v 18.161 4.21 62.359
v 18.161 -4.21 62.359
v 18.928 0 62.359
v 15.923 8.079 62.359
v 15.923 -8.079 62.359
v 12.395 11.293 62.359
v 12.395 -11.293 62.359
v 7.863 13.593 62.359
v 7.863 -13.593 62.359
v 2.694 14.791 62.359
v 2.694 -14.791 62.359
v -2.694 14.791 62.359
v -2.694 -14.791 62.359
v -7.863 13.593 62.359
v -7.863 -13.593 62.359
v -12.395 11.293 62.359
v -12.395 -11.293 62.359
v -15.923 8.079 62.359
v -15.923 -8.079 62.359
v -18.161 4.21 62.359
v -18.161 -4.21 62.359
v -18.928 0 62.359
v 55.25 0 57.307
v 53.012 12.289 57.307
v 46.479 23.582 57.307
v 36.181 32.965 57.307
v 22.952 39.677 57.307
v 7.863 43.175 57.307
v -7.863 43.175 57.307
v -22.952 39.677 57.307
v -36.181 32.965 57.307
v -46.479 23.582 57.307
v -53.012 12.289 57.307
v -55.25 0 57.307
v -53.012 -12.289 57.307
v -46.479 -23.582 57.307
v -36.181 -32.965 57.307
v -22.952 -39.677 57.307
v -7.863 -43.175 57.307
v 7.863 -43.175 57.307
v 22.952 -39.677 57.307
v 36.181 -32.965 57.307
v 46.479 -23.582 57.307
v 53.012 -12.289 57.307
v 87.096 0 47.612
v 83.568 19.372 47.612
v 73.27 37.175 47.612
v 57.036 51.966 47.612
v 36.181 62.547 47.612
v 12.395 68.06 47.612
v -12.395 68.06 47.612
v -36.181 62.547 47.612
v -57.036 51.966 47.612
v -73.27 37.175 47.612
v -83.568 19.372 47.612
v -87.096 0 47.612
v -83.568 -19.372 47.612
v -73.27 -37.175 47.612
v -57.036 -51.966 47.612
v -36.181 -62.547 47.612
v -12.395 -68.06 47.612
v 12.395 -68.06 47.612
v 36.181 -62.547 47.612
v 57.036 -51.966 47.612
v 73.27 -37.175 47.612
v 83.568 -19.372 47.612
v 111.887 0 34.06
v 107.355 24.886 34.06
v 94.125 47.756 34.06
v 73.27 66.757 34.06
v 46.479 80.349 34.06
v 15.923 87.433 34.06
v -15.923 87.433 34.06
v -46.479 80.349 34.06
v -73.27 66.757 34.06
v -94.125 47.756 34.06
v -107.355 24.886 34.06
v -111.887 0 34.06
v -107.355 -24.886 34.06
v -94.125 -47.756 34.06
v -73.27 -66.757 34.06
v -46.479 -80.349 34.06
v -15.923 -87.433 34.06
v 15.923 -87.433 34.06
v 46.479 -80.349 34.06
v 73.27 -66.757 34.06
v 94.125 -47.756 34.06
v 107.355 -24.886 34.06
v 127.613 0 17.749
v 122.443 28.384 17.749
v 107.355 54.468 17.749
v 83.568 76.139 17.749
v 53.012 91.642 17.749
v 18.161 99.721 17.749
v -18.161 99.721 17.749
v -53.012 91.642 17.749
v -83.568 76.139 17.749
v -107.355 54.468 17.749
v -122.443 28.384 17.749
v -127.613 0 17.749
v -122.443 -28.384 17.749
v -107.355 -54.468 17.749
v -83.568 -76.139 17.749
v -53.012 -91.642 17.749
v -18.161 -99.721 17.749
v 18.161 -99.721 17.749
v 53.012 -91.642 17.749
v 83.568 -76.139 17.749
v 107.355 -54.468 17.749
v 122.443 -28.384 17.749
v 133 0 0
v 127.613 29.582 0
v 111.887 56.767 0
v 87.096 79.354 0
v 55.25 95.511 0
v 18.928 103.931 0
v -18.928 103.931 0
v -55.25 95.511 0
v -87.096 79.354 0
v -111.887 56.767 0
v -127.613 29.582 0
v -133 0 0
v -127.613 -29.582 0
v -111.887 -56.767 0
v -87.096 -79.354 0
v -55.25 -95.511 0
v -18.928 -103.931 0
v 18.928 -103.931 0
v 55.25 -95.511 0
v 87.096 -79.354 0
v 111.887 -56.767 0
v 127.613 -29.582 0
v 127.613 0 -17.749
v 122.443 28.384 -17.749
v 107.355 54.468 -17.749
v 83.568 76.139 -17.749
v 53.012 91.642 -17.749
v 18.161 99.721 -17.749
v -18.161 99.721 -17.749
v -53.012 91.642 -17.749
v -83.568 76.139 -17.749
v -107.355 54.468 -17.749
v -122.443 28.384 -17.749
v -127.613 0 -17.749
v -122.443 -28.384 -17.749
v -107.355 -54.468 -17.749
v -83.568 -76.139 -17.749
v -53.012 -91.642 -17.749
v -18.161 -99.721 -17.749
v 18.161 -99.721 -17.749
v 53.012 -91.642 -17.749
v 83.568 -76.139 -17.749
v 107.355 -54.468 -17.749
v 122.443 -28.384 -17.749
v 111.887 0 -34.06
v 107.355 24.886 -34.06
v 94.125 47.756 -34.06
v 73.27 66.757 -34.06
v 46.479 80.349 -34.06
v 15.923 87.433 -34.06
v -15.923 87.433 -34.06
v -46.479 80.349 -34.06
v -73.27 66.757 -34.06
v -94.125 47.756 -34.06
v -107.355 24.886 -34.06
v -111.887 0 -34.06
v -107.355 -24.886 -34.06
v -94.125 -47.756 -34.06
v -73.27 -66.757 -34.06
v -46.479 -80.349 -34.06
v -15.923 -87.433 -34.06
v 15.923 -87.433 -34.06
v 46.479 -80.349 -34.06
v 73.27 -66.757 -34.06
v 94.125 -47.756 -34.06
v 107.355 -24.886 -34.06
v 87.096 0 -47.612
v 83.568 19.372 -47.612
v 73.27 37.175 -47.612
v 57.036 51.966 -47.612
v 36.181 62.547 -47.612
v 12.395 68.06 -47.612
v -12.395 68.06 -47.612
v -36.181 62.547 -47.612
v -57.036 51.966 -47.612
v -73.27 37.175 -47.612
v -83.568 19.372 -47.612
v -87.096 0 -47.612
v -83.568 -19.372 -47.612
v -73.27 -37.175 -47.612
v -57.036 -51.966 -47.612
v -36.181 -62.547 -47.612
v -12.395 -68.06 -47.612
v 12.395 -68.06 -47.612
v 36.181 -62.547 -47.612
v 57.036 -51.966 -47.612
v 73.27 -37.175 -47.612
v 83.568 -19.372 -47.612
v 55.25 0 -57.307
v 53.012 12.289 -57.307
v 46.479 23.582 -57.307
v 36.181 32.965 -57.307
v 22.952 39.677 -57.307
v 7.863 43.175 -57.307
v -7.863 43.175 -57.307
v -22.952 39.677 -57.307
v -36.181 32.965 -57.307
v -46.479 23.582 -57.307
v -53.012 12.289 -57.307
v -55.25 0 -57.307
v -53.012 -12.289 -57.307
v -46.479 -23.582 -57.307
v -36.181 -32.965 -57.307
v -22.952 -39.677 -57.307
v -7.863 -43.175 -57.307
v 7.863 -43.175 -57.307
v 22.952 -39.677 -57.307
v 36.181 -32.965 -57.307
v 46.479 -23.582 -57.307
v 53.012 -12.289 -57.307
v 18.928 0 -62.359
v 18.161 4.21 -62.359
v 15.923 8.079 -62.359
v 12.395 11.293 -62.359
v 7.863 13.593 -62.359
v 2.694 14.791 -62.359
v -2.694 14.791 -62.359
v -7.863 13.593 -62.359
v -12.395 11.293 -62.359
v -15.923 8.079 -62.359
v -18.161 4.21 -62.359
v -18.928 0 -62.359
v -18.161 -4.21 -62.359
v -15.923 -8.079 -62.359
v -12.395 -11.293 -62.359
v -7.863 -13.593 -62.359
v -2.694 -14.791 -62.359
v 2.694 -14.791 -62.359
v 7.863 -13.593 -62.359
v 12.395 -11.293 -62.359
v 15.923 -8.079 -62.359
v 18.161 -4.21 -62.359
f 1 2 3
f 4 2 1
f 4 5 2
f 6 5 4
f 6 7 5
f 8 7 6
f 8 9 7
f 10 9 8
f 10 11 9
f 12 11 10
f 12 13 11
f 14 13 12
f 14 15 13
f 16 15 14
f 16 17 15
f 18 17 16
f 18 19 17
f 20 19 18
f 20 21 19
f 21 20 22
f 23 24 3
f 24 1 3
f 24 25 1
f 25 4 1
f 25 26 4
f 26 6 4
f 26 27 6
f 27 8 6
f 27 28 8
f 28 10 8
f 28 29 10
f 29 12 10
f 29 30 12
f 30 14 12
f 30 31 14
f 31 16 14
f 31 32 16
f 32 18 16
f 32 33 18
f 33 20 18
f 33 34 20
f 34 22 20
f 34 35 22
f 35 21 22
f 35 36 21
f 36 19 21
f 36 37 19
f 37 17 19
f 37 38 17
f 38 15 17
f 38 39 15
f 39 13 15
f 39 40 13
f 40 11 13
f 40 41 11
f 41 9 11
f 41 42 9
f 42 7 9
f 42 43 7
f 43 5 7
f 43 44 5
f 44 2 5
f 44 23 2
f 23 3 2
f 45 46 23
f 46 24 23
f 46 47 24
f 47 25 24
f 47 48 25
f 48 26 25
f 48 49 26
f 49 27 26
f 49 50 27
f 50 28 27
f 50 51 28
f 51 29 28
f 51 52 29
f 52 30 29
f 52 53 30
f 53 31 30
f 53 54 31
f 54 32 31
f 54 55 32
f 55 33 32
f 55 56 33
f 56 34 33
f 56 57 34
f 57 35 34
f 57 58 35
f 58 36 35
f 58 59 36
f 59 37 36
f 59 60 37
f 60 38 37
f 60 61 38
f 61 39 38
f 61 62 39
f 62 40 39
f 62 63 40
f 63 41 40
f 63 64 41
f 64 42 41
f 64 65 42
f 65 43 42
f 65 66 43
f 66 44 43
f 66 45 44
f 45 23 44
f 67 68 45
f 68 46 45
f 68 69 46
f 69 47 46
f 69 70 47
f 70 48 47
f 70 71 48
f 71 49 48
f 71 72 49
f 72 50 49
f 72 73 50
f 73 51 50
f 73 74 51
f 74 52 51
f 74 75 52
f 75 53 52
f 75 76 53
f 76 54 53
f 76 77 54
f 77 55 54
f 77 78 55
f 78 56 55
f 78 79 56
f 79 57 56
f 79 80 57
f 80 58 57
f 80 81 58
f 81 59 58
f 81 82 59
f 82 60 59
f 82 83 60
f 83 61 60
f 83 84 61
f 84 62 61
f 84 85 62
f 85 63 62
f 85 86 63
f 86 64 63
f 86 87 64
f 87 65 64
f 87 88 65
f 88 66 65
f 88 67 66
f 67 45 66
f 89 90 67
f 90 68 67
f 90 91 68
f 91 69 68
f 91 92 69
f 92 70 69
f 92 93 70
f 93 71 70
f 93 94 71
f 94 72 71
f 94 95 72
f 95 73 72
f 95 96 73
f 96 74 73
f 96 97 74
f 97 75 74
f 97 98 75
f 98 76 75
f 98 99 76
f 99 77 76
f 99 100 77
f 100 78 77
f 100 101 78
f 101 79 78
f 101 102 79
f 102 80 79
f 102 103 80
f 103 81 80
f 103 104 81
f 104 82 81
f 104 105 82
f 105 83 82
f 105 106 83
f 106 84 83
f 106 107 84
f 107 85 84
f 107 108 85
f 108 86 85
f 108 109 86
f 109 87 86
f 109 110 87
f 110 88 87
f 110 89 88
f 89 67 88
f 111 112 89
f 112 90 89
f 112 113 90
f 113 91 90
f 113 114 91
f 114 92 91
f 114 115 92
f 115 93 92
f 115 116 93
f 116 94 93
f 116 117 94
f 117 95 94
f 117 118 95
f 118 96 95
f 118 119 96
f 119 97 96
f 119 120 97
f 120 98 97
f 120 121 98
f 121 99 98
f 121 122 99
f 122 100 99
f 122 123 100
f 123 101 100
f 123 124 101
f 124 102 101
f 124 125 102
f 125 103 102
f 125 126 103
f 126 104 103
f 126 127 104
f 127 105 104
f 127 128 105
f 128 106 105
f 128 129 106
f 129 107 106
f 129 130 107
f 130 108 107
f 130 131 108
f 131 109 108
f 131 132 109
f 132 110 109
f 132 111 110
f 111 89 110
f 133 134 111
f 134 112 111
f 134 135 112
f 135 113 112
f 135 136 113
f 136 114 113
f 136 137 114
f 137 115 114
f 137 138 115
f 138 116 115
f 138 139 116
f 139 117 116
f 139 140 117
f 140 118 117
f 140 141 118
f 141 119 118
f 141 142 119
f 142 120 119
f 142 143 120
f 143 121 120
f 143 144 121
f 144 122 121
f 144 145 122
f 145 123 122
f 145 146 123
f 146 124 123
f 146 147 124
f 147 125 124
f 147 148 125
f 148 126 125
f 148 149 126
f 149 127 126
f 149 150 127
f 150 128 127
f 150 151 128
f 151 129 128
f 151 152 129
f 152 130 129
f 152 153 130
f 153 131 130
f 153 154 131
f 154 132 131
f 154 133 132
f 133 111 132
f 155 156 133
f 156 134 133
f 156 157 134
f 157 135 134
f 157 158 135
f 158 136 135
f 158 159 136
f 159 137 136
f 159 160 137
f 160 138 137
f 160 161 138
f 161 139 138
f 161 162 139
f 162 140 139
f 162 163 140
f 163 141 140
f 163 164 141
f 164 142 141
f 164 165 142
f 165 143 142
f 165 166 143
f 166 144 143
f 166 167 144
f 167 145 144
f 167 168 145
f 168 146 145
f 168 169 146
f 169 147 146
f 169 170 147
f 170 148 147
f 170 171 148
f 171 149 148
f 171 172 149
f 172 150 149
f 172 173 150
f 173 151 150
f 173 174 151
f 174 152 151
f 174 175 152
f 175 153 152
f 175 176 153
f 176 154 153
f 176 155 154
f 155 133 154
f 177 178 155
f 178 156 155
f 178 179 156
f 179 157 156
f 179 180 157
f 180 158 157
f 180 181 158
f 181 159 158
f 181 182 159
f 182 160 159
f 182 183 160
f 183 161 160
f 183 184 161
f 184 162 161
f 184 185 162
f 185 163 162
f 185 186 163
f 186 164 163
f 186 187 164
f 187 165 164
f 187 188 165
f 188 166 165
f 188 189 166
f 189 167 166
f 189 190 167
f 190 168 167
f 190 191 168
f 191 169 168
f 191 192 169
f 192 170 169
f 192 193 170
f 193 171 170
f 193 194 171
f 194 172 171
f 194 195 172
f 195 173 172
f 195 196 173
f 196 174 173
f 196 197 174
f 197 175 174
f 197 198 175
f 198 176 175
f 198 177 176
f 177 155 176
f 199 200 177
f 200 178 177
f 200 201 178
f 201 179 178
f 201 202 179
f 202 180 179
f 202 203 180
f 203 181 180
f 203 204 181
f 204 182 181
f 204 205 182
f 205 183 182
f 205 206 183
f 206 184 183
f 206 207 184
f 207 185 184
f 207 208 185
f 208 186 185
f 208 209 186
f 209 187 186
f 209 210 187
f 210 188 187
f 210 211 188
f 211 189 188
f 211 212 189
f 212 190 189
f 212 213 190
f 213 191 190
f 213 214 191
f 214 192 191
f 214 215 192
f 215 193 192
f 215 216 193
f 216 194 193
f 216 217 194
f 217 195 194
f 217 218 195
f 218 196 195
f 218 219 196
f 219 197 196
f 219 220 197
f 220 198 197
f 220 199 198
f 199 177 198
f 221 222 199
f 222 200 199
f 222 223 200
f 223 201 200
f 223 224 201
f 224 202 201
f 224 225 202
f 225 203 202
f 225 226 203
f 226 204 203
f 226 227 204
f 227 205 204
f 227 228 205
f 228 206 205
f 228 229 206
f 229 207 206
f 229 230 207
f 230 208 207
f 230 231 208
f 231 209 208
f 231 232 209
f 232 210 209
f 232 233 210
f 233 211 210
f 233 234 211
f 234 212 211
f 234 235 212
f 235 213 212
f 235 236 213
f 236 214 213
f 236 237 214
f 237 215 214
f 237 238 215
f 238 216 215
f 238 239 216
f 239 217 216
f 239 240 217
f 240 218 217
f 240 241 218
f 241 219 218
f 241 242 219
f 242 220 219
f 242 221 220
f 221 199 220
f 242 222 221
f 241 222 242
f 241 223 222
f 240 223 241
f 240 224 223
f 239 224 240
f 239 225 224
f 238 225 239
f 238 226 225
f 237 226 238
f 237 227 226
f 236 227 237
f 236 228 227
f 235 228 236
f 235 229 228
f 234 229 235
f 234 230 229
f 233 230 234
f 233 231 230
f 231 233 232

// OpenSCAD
// Generated by SolidPython 1.0.1 on 2020-07-29 00:46:54


scale(v = [19, 15, 9]) {
	sphere(r = 7);
}
/***********************************************
*********      SolidPython code:      **********
************************************************
 
# import packages: SolidPython
from solid import *
from solid.utils import *
from itertools import chain, combinations, permutations


class Resize:

    def __init__(self, scad_file):
        self.scad_file = scad_file
        #self.scad_file = import_scad(scad_file)
        # cone/cylinder param:
        self.r1 = 0
        self.r2 = 0
        self.h = 0
        # rectangular prism param:
        self.w = 0
        self.l = 0
        # ellipse param:
        self.r = 0

    # import OpenScad code (file name corresponds to shape)


    # classify shape + parameters
    def assign(self, param1, param2, param3):
        if self.scad_file == 'cone.scad':
            self.r1 = param1
            self.r2 = param2
            self.h = param3
        elif self.scad_file == 'cylinder.scad':
            self.r1 = param1
            self.r2 = param2
            self.h = param3
        elif self.scad_file == 'rectangularPrism.scad':
            self.h = param1
            self.l = param2
            self.w = param3
        else:
            self.r = param1
            self.h = param2

    # resize parameters
    def iterate(self):
        x = range(3, 20, 2)
        i = 1
        if self.scad_file == 'cone.scad':
            tempList = list(permutations(x, 2))
            for temp in tempList:
                param1 = temp[0]
                param2 = temp[1]
                filepath = 'produced_scad_files/' + 'cone' + str(param1) + '_' + str(param2) + '_' + '.scad'
                scad_render_to_file(cylinder(h=param1, r1=param2, r2=0), filepath)

        elif self.scad_file == 'cylinder.scad':
            tempList = list(permutations(x, 3))
            for temp in tempList:
                param1 = temp[0]
                param2 = temp[1]
                filepath = 'produced_scad_files/' + 'cylinder' + str(param1) + '_' + str(param2) + '_' + '.scad'
                scad_render_to_file(cylinder(h=param1, r1=param2, r2=param2), filepath)

        elif self.scad_file == 'rectangularPrism.scad':
            tempList = list(permutations(x, 3))
            for temp in tempList:
                param1 = temp[0]
                param2 = temp[1]
                param3 = temp[2]
                filepath = 'produced_scad_files/' + 'rectangularPrism' + str(param1) + '_' + str(param2) + '_' + str(
                    param3) + '.scad'
                scad_render_to_file(cube(size=(param1, param2, param3)), filepath)

        elif self.scad_file == 'ellipse.scad':
            tempList = list(permutations(x, 4))
            for temp in tempList:
                param1 = temp[0]
                param2 = temp[1]
                param3 = temp[2]
                param4 = temp[3]
                filepath = 'produced_scad_files/' + 'ellipse' + str(param1) + '_' + str(param2) + '_' + str(param3) + '_' + str(param4) + '.scad'
                scad_render_to_file(scale([param1, param2, param3])(sphere(r=param4)), filepath)

    def render_to_scadfile(self):
        scad_render_to_file(scad, 'example.scad') 
 
************************************************/
